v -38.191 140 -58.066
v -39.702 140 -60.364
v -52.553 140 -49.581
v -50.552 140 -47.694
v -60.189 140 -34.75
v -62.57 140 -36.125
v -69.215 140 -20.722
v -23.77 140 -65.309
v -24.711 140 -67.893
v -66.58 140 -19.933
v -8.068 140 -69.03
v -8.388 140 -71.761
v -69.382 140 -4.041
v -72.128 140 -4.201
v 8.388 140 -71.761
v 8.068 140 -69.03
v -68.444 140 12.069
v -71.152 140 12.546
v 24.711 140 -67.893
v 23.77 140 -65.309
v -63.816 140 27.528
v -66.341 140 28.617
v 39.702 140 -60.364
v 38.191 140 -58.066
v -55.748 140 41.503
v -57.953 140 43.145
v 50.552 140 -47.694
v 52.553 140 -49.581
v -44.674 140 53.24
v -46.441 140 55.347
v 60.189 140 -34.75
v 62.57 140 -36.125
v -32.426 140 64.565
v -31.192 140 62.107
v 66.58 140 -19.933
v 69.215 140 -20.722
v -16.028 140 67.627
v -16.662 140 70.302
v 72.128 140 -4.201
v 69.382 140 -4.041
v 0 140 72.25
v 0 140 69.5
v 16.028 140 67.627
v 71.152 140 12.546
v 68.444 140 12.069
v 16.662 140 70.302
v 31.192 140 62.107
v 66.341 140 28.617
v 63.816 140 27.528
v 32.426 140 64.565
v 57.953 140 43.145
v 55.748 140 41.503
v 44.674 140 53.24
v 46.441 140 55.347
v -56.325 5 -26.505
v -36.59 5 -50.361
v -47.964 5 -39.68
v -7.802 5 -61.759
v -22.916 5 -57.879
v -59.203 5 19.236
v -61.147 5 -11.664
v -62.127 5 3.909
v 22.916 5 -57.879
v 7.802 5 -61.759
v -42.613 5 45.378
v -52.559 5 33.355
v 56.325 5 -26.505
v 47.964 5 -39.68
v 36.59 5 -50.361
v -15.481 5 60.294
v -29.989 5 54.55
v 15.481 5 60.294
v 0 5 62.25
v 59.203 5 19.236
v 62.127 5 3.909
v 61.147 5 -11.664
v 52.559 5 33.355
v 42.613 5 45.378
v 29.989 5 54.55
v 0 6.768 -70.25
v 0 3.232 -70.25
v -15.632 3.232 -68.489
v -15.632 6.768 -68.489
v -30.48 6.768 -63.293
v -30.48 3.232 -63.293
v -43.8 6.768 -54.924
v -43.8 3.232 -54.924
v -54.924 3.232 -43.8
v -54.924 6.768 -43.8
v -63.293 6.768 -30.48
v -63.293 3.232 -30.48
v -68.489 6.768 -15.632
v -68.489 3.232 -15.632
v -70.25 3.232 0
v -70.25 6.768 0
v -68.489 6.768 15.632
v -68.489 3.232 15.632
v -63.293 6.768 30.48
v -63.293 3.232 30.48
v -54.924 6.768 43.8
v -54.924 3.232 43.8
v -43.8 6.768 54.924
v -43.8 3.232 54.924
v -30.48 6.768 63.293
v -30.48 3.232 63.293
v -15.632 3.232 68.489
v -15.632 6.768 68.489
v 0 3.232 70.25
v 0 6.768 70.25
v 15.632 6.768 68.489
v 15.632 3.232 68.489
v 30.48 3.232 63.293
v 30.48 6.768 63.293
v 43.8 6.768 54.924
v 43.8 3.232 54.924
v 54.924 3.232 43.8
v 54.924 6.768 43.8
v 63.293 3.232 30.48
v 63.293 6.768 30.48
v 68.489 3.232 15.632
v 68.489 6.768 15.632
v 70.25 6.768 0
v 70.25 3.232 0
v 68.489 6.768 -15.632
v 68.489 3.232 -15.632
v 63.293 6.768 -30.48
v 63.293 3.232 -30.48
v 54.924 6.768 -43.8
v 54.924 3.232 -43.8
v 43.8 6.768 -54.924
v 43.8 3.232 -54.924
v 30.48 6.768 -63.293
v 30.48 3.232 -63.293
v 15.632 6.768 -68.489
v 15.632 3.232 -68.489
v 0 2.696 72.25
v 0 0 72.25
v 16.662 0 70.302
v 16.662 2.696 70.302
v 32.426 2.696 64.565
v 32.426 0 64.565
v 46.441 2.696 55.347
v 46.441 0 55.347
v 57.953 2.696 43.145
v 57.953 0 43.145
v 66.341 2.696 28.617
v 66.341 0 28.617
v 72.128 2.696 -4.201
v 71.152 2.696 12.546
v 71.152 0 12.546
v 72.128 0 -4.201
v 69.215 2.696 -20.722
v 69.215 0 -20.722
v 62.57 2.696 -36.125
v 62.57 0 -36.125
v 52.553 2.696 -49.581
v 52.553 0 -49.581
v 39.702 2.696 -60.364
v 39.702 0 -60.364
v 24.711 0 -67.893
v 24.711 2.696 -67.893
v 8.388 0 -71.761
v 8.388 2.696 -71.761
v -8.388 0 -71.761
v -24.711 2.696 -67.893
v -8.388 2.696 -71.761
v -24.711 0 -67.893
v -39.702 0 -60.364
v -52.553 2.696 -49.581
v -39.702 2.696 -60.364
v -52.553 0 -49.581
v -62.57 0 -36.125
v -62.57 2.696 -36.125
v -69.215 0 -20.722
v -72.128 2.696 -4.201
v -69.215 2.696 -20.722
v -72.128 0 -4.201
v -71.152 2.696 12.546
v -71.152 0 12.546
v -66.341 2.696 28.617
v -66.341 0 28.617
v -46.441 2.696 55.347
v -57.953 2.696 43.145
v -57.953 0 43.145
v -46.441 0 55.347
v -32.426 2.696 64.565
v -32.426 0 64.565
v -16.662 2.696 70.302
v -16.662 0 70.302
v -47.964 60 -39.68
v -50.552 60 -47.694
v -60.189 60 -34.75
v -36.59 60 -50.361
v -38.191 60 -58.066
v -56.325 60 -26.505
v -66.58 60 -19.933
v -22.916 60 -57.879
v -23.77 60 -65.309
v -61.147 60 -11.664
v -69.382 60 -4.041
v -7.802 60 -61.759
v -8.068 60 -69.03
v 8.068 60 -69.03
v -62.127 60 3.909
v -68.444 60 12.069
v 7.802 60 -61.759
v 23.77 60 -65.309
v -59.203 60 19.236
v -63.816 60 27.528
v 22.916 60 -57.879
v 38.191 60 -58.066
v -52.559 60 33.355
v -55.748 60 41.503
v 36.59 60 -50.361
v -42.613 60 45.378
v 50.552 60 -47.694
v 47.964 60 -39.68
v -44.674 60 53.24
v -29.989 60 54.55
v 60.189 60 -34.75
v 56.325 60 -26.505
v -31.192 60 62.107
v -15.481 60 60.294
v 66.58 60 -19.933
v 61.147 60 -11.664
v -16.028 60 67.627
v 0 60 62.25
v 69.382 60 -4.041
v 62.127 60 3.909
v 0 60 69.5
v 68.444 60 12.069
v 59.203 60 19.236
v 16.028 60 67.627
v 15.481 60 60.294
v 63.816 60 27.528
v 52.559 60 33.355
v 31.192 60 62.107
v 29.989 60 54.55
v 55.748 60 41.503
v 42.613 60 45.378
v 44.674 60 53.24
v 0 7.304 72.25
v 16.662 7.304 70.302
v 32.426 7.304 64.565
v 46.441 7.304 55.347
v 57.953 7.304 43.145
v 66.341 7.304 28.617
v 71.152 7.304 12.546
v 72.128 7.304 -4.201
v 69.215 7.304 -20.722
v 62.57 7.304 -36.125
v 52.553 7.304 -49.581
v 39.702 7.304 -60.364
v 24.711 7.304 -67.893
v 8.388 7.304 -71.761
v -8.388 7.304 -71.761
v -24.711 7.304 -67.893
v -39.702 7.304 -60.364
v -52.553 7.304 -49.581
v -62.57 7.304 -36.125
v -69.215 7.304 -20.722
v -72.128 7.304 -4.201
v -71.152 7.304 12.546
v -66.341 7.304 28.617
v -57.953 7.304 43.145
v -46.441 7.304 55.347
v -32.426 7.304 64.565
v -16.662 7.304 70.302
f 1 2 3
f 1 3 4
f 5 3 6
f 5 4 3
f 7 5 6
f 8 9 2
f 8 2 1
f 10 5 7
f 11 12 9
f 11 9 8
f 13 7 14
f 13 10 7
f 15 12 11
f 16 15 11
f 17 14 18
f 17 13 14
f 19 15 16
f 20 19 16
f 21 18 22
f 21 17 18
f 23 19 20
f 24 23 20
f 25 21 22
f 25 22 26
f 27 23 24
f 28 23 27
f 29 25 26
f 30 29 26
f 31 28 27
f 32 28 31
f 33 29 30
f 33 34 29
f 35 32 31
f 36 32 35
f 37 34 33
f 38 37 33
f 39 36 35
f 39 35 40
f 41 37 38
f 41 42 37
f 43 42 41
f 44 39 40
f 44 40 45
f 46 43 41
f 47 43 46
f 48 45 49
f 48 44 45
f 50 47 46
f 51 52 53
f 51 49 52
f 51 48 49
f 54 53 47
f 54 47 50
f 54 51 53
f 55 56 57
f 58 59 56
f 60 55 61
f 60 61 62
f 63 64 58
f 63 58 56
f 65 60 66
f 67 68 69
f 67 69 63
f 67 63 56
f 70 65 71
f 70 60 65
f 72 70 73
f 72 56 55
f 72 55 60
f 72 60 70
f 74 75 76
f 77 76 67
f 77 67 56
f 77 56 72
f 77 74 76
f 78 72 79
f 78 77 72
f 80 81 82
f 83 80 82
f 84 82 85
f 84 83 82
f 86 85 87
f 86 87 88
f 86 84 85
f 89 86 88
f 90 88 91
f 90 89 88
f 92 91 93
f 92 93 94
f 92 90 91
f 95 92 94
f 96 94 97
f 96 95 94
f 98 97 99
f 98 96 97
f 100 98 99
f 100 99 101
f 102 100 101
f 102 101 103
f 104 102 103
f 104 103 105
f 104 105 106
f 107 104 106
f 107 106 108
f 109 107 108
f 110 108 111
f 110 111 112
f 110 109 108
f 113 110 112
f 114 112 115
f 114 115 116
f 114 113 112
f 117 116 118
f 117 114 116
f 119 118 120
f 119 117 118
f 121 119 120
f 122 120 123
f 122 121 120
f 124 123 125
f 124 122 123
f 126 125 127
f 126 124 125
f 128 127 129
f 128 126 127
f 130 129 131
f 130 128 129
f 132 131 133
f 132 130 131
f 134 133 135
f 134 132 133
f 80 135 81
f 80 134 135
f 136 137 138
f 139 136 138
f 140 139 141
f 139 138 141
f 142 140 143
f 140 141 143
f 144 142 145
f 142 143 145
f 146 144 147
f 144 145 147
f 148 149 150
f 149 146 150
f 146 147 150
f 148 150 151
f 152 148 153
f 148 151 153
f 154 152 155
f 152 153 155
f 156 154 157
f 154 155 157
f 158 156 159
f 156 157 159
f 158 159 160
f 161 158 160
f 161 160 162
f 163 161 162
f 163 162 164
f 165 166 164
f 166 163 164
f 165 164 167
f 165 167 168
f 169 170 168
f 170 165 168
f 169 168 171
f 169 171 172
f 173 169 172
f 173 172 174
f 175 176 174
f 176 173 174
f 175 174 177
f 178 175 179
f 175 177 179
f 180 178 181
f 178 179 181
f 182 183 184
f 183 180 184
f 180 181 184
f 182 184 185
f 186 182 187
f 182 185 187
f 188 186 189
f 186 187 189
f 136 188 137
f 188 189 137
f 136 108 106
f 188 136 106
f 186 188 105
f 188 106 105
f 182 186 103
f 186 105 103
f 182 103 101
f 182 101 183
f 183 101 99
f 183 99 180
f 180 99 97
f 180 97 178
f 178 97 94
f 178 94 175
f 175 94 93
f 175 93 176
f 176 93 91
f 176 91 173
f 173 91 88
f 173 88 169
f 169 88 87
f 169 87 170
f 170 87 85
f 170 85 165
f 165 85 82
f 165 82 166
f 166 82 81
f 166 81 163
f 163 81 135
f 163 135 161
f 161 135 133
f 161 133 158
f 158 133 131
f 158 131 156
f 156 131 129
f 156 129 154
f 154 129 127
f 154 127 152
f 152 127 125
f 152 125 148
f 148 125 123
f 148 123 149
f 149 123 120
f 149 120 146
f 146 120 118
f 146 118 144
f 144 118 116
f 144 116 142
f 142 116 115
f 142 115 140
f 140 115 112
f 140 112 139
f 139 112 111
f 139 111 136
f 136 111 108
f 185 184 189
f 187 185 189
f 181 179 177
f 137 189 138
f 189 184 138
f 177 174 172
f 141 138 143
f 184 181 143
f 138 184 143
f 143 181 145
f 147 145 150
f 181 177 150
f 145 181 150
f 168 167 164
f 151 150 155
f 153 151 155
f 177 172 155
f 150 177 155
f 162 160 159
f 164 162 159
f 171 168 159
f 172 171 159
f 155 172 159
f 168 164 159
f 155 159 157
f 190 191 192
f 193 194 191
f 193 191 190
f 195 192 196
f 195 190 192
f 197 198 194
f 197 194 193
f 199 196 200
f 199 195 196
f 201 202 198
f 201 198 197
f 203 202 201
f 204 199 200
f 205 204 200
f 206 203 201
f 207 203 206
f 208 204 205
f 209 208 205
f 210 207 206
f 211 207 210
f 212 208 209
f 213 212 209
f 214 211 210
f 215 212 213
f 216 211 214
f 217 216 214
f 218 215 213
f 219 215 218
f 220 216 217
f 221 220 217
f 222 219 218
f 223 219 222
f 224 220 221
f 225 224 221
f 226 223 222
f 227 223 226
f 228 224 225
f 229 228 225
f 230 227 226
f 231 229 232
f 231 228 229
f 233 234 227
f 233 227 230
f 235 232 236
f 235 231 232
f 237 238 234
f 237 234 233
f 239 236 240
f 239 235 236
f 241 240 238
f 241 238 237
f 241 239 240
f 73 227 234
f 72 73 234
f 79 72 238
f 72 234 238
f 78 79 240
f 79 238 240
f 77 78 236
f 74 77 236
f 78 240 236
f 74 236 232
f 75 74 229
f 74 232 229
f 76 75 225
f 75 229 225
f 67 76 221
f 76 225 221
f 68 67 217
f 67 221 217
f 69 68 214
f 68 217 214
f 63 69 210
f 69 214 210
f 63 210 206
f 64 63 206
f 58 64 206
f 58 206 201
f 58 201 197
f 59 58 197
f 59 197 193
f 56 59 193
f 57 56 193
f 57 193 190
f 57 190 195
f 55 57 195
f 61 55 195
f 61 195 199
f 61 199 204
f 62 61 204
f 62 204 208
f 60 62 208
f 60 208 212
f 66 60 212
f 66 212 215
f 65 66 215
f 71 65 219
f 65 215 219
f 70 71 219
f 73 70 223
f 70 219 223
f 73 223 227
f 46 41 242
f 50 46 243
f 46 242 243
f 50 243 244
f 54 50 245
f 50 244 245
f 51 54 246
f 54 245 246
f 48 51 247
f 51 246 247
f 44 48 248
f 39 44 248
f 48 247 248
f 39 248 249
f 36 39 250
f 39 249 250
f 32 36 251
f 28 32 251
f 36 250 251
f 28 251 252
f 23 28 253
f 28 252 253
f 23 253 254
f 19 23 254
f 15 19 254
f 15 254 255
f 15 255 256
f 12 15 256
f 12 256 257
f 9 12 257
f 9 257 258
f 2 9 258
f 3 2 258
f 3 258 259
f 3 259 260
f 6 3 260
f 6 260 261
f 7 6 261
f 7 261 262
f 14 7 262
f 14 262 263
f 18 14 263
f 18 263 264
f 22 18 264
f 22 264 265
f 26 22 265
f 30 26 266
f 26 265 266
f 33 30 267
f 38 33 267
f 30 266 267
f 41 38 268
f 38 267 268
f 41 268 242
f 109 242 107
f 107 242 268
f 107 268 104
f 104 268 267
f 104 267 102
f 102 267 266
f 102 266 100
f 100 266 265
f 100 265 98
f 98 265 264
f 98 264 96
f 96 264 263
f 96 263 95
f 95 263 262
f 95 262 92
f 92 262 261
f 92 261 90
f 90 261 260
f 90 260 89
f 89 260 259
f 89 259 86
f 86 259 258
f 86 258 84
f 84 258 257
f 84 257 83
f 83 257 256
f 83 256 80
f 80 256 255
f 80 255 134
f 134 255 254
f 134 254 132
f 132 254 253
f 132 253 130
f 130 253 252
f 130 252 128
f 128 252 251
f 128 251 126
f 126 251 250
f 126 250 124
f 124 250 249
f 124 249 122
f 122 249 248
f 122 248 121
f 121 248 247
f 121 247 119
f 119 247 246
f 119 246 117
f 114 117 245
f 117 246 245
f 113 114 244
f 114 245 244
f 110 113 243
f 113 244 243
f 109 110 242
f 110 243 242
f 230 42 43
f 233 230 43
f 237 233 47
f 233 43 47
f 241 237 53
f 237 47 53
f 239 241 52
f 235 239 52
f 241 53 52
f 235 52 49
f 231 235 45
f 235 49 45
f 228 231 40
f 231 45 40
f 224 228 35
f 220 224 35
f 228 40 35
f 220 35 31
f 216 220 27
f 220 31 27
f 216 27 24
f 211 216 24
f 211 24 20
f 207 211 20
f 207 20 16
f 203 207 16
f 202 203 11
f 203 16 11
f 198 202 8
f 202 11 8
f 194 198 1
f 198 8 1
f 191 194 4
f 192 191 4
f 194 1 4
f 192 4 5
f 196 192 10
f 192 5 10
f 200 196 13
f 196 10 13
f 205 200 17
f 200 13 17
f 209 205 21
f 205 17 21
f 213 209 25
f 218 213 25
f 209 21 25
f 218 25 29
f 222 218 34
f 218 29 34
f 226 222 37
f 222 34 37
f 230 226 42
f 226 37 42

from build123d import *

# Parameters (mm, degrees)
SKETCH_1_R          = 72.25
SKETCH_1_R_2        = 71
EXTRUDE_1_DEPTH     = 140
SKETCH_2_W          = 2
SKETCH_2_H          = 3
CHAMFER_3_SIZE      = 0.803847577
CHAMFER_3_SIZE_2    = 3
CHAMFER_5_SIZE      = 3
CHAMFER_5_SIZE_2    = 0.803847577
SKETCH_3_R          = 62.25
CUT_EXTRUDE_7_DEPTH = 135
CUT_EXTRUDE_START   = 135
SKETCH_8_R          = 69.5
CUT_EXTRUDE_9_DEPTH = 80


with BuildPart() as part:
    # 草圖1 → 填料-伸長1 (new body)
    # profile 1 of 2: a face of its own
    with BuildSketch(Plane(origin=(0, 0, 0), x_dir=(1, 0, 0), z_dir=(0, 1, 0))):
        with Locations(Location((0, 0, 0), (0, 0, 270))):
            Circle(SKETCH_1_R)
        Circle(SKETCH_1_R_2, mode=Mode.SUBTRACT)
    # profile 2 of 2: a face of its own
    with BuildSketch(Plane(origin=(0, 0, 0), x_dir=(1, 0, 0), z_dir=(0, 1, 0))):
        Circle(SKETCH_1_R_2)
    extrude(amount=EXTRUDE_1_DEPTH)

    # 草圖2 → 除料-旋轉1 (revolve, cut)
    with BuildSketch(Plane.XY, mode=Mode.PRIVATE) as cut_revolve_1_sk:
        with Locations((71.25, 5)):
            Rectangle(SKETCH_2_W, SKETCH_2_H)
    revolve(cut_revolve_1_sk.sketch.rotate(Axis((0, 0, 0), (0, 1, 0)), 90), axis=Axis((0, 0, 0), (0, 1, 0)), mode=Mode.SUBTRACT)

    # 導角3
    # the kernel refuses this chamfer: 3, 0.803847577 mm, written as the material it takes off along each edge
    with BuildSketch(Plane(origin=(0, 3.5, 0), x_dir=(0, 0, 1), z_dir=(1, 0, 0))) as chamfer_3_piece_1_section:
        Polygon((72.25, CHAMFER_3_SIZE), (72.25 - CHAMFER_3_SIZE_2, 0), (72.25, 0), align=None)
    chamfer_3_piece_1 = revolve(axis=Axis((0, 3.5, 0), (0, -1, 0)), mode=Mode.PRIVATE)
    chamfer_3_piece_1 = chamfer_3_piece_1 - Plane(origin=(0, 3.028349799, 0), x_dir=(0, 0, -1), z_dir=(0, 1, 0)) * Cylinder(70.25, 289, mode=Mode.PRIVATE)
    add(chamfer_3_piece_1, mode=Mode.SUBTRACT)

    # 導角5
    # the kernel refuses this chamfer: 3, 0.803847577 mm, written as the material it takes off along each edge
    with BuildSketch(Plane(origin=(0, 6.5, 0), x_dir=(0, 0, 1), z_dir=(1, 0, 0))) as chamfer_5_piece_1_section:
        Polygon((72.25 - CHAMFER_5_SIZE, 0), (72.25, -CHAMFER_5_SIZE_2), (72.25, 0), align=None)
    chamfer_5_piece_1 = revolve(axis=Axis((0, 6.5, 0), (0, -1, 0)), mode=Mode.PRIVATE)
    chamfer_5_piece_1 = chamfer_5_piece_1 - Plane(origin=(0, 6.971650201, 0), x_dir=(0, 0, -1), z_dir=(0, 1, 0)) * Cylinder(70.25, 289, mode=Mode.PRIVATE)
    add(chamfer_5_piece_1, mode=Mode.SUBTRACT)

    # 草圖3 → 除料-伸長7 (cut)
    with BuildSketch(Plane(origin=(0, 140, 0), x_dir=(1, 0, 0), z_dir=(0, 1, 0))):
        with Locations(Location((0, 0, 0), (0, 0, 270))):
            Circle(SKETCH_3_R)
    extrude(amount=-CUT_EXTRUDE_7_DEPTH, mode=Mode.SUBTRACT)

    # 草圖8 → 除料-伸長9 (cut)
    with BuildSketch(Plane(origin=(0, 5, 0), x_dir=(1, 0, 0), z_dir=(0, 1, 0)).offset(CUT_EXTRUDE_START)):
        with Locations(Location((0, 0, 0), (0, 0, 270))):
            Circle(SKETCH_8_R)
    extrude(amount=-CUT_EXTRUDE_9_DEPTH, mode=Mode.SUBTRACT)


solid = part.part
